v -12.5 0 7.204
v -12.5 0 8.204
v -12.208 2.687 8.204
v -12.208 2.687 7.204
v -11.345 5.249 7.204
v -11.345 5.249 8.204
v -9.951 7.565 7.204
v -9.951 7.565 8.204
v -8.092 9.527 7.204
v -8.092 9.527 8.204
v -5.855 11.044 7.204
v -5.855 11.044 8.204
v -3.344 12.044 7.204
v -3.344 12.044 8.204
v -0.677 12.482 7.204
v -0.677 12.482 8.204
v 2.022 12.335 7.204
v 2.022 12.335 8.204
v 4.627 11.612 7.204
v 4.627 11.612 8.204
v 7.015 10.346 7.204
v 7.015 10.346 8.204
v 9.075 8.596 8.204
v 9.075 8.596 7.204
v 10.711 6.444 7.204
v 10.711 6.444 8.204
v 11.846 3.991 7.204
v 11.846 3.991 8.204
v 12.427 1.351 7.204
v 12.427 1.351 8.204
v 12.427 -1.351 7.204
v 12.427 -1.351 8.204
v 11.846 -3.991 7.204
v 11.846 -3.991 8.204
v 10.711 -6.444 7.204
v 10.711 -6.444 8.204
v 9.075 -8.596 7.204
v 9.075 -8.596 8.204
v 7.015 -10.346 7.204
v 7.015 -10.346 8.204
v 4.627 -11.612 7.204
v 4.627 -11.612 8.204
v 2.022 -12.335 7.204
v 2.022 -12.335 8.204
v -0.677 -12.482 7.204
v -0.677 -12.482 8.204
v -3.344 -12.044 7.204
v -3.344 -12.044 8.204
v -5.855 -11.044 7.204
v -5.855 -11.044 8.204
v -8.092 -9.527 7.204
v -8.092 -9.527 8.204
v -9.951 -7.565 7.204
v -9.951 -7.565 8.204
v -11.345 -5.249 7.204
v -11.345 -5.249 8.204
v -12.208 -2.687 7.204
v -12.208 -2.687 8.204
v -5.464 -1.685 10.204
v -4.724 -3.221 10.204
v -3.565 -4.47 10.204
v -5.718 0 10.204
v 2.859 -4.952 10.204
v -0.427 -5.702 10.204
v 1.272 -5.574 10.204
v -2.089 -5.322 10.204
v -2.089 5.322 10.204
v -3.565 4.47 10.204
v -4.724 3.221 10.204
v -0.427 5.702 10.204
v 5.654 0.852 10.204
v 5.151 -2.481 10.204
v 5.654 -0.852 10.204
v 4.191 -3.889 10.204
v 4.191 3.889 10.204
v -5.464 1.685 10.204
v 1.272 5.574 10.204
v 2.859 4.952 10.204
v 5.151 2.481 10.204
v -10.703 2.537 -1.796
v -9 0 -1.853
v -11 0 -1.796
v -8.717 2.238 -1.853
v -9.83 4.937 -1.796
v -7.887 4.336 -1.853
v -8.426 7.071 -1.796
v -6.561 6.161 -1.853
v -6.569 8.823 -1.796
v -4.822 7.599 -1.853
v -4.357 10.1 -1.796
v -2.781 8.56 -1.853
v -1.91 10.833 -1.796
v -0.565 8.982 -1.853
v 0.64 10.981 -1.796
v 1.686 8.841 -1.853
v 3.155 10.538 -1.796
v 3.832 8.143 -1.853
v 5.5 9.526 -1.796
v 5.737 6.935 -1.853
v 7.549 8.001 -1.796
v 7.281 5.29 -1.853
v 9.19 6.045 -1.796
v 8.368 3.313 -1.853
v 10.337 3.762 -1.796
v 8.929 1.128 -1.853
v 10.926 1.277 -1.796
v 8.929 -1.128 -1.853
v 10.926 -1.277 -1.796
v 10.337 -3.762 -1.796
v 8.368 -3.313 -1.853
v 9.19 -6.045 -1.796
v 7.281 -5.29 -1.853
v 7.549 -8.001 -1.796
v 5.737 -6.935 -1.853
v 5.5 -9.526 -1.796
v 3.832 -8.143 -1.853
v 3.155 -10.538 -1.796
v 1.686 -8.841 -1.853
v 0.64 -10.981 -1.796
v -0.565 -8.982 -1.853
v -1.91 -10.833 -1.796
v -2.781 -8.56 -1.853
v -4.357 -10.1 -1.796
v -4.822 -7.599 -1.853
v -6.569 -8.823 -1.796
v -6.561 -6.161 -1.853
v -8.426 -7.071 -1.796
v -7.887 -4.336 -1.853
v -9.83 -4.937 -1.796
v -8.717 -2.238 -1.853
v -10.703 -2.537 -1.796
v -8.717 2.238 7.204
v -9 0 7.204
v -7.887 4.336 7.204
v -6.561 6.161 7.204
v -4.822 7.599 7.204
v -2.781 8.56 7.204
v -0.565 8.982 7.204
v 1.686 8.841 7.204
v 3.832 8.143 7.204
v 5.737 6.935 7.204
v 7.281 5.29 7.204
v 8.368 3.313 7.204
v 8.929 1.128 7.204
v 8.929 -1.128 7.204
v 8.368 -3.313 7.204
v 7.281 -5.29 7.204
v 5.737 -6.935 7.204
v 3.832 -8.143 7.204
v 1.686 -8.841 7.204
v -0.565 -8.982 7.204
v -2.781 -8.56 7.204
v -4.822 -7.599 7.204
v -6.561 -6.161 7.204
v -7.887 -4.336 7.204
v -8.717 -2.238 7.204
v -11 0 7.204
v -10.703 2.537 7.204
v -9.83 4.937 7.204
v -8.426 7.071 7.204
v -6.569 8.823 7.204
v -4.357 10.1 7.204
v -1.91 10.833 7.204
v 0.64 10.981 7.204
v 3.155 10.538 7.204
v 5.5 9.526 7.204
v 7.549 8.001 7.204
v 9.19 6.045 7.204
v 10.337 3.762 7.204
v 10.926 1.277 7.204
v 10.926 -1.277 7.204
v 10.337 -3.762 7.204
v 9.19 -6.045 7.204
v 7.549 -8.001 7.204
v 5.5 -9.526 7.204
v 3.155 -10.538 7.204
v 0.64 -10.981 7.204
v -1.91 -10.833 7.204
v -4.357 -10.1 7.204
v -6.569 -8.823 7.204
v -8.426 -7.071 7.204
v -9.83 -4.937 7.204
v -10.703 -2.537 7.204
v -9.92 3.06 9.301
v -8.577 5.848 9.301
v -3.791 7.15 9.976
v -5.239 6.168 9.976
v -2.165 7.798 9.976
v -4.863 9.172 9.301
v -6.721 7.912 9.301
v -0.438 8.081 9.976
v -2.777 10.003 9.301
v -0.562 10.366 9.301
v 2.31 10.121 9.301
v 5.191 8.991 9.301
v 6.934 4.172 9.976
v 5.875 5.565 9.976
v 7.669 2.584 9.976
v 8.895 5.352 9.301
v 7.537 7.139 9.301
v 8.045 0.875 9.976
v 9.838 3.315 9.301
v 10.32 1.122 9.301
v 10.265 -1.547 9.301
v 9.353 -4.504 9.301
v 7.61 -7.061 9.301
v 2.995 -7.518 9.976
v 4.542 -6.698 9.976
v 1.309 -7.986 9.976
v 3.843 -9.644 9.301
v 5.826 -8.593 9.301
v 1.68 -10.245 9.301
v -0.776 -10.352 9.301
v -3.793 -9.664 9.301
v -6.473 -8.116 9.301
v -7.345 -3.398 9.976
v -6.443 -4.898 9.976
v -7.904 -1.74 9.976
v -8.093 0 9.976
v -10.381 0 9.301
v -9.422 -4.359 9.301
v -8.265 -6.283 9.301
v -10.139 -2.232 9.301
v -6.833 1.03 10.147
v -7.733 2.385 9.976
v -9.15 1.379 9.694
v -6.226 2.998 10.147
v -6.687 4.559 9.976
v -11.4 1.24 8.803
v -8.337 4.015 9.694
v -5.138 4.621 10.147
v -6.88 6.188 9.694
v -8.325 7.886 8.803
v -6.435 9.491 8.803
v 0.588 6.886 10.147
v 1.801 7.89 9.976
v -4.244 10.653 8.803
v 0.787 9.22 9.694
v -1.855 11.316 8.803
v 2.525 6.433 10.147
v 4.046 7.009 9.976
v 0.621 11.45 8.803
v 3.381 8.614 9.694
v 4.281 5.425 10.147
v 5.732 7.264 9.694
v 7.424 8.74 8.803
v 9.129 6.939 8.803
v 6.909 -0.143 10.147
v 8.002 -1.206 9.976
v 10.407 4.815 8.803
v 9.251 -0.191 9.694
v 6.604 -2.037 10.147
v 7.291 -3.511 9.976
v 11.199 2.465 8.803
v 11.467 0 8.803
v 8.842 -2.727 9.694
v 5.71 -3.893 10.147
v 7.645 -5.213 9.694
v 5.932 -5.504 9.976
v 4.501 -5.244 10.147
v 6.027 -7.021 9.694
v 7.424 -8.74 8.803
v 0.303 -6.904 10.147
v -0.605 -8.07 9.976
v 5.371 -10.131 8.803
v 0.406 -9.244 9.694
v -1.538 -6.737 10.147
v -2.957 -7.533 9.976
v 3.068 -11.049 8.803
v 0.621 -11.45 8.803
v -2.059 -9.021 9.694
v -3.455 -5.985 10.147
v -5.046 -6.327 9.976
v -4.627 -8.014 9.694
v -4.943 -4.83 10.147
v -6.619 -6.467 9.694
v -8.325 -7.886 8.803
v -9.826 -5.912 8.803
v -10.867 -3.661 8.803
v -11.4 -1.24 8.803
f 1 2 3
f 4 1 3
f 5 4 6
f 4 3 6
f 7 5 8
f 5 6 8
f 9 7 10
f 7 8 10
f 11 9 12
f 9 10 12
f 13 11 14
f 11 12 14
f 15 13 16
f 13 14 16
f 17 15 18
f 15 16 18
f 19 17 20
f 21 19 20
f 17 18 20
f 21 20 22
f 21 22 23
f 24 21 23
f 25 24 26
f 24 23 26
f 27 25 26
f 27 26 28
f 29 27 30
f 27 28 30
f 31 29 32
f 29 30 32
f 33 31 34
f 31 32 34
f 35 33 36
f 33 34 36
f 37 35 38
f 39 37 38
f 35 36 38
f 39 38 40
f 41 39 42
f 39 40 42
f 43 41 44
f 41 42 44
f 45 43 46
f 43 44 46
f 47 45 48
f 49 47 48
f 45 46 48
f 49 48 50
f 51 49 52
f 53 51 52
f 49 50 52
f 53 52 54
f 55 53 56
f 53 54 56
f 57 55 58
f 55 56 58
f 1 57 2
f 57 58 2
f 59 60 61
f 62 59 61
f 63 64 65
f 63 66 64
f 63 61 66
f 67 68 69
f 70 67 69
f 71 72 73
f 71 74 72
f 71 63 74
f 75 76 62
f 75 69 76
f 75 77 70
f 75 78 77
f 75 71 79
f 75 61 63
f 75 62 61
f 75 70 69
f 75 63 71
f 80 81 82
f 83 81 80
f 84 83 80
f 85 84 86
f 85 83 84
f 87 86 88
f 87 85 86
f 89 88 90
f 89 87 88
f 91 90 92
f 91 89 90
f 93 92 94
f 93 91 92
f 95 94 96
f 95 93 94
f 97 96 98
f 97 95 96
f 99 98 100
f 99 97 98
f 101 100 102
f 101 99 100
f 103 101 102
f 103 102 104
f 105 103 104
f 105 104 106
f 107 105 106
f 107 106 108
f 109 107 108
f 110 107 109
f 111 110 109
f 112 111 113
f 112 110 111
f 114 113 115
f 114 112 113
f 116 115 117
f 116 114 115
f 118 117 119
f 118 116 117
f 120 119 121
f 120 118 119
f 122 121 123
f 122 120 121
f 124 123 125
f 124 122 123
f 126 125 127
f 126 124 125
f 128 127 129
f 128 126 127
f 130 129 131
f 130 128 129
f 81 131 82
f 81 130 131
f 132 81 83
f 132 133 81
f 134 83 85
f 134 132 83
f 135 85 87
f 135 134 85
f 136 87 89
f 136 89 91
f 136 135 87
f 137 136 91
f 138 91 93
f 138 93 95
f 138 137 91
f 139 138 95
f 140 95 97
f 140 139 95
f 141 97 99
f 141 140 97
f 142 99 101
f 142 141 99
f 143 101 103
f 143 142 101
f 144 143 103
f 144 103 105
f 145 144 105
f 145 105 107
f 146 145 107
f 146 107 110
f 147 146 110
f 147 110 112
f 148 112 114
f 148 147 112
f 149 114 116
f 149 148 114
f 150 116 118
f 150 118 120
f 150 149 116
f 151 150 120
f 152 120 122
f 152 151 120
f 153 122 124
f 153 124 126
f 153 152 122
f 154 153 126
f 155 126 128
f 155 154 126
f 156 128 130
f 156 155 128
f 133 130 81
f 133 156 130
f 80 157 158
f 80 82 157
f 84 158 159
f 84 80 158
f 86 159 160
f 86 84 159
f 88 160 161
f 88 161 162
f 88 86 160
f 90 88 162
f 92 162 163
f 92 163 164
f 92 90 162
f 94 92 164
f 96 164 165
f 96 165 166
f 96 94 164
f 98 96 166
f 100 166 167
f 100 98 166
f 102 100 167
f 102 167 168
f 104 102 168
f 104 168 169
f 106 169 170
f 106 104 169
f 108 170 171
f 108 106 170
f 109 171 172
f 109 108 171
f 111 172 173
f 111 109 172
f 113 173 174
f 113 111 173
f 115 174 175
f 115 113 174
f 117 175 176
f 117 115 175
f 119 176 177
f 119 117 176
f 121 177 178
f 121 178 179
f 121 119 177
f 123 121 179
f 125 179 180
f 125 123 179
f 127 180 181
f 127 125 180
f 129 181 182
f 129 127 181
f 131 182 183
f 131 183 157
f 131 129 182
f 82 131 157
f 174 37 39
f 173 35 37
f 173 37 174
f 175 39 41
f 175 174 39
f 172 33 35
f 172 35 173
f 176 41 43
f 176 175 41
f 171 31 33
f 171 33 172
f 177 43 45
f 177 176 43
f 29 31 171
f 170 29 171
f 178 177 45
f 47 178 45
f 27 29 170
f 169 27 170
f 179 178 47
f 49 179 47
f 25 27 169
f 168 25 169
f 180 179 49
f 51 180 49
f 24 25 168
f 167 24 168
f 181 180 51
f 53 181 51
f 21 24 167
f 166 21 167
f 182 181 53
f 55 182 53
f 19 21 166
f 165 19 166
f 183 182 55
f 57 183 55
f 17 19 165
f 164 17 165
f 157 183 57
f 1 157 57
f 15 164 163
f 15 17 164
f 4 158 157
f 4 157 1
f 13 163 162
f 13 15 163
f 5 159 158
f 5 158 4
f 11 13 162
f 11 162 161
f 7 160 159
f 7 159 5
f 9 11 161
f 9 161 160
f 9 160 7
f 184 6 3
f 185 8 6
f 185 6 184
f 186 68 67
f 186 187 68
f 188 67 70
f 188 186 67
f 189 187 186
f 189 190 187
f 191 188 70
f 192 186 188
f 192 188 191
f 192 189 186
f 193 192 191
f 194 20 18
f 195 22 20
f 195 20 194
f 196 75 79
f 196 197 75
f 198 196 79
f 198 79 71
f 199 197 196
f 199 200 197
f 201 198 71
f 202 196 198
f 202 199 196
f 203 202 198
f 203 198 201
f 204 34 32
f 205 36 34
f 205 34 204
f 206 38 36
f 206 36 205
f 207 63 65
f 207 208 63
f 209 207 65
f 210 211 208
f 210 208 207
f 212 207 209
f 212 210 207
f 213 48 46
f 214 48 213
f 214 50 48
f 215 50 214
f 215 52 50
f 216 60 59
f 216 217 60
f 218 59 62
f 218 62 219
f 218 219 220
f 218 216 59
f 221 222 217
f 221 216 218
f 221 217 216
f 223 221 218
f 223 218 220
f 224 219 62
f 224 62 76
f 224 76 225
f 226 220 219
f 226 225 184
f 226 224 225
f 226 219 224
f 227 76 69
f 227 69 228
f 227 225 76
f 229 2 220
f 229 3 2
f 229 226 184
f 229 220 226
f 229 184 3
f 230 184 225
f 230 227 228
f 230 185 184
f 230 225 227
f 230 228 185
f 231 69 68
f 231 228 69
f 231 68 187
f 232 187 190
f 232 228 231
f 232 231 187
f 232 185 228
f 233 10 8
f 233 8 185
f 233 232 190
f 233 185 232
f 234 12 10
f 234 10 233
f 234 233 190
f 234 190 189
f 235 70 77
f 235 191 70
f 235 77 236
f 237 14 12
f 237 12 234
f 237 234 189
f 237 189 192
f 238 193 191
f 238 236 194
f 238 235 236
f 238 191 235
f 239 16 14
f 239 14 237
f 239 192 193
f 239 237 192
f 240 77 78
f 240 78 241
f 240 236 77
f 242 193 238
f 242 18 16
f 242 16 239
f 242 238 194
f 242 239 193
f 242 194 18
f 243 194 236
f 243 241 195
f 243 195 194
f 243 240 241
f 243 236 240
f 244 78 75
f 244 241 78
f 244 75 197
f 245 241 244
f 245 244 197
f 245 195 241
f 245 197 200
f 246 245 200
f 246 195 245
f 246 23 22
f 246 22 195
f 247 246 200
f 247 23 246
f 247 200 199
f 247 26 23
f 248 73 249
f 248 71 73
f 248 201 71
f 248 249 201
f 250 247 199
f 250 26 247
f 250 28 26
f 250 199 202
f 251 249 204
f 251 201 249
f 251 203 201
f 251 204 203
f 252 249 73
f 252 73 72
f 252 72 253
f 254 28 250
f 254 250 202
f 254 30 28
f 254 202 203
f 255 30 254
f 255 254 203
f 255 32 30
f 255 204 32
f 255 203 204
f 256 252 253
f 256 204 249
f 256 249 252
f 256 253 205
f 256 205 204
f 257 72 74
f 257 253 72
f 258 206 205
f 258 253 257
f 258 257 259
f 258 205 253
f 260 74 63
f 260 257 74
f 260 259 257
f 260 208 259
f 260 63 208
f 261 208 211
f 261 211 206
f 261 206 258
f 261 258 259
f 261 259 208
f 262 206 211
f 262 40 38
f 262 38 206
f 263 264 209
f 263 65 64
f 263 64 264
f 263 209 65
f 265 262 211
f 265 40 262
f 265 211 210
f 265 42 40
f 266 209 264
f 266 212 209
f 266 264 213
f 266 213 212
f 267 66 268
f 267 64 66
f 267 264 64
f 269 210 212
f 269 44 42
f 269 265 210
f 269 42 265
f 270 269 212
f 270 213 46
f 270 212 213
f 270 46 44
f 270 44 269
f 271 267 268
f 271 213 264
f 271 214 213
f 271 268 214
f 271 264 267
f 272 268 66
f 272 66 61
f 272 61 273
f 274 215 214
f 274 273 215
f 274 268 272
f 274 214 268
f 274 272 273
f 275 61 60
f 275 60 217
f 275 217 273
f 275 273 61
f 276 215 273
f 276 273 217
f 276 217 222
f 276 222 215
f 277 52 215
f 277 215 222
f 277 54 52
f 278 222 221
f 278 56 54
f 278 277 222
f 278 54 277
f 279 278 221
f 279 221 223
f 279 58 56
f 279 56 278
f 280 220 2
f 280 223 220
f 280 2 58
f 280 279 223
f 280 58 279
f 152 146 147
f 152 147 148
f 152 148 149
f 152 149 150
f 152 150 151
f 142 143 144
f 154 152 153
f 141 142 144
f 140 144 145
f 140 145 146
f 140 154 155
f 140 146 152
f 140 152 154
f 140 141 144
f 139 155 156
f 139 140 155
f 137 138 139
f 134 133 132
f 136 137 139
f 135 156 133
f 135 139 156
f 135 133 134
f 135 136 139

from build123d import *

# Parameters (mm, degrees)
F3_DEPTH = 1


# Not quite as in the source:
# - a fillet or chamfer that OpenCascade refuses, or shapes differently, is made with other operations: its cross-section is extruded or revolved along the edge and cut away or added


with BuildPart() as f1:
    # F0 (on Front) → F1 (revolve)
    with BuildSketch(Plane.XZ):
        Polygon((0, 7.2039468596), (0, 10.2039468596), (-12.5, 10.2039468596), (-12.5, 8.2039468596), (-11, 8.2039468596), (-11, -1.7960531404), (-9, -1.853223308), (-9, 7.2039468596), align=None)
    revolve(axis=Axis((0, 0, 8.7039468596), (0, 0, -1)))

    # F2: fillet of radius 12.5 on 1 edges, made by hand

    # F2_s1 → F2_t2 (revolve, cut)
    with BuildSketch(Plane.XZ):
        with BuildLine():
            ThreePointArc((-5.7176700169, 10.2039468596), (-9.2532039228, 9.6935256679), (-12.5, 8.2039468596))
            Line((-12.5, 8.2039468596), (-12.6356465997, 8.4139468596))
            ThreePointArc((-12.6356465997, 8.4139468596), (-12.75, 9.2039468596), (-12.75, 10.2039468596))
            Line((-12.75, 10.2039468596), (-12.5, 10.4539468596))
            Line((-12.5, 10.4539468596), (-5.7176700169, 10.4539468596))
            Line((-5.7176700169, 10.4539468596), (-5.7176700169, 10.2039468596))
        make_face()
    revolve(axis=Axis((0, 0, 10.2039468596), (0, 0, -1)), mode=Mode.SUBTRACT)

    # F3 (add): a face of the model
    f3_faces = [f1.faces().sort_by_distance(p)[0] for p in [
        (12.1464466094, 0, 8.2039468596),
    ]]
    extrude(f3_faces, amount=F3_DEPTH)


solid = f1.part
